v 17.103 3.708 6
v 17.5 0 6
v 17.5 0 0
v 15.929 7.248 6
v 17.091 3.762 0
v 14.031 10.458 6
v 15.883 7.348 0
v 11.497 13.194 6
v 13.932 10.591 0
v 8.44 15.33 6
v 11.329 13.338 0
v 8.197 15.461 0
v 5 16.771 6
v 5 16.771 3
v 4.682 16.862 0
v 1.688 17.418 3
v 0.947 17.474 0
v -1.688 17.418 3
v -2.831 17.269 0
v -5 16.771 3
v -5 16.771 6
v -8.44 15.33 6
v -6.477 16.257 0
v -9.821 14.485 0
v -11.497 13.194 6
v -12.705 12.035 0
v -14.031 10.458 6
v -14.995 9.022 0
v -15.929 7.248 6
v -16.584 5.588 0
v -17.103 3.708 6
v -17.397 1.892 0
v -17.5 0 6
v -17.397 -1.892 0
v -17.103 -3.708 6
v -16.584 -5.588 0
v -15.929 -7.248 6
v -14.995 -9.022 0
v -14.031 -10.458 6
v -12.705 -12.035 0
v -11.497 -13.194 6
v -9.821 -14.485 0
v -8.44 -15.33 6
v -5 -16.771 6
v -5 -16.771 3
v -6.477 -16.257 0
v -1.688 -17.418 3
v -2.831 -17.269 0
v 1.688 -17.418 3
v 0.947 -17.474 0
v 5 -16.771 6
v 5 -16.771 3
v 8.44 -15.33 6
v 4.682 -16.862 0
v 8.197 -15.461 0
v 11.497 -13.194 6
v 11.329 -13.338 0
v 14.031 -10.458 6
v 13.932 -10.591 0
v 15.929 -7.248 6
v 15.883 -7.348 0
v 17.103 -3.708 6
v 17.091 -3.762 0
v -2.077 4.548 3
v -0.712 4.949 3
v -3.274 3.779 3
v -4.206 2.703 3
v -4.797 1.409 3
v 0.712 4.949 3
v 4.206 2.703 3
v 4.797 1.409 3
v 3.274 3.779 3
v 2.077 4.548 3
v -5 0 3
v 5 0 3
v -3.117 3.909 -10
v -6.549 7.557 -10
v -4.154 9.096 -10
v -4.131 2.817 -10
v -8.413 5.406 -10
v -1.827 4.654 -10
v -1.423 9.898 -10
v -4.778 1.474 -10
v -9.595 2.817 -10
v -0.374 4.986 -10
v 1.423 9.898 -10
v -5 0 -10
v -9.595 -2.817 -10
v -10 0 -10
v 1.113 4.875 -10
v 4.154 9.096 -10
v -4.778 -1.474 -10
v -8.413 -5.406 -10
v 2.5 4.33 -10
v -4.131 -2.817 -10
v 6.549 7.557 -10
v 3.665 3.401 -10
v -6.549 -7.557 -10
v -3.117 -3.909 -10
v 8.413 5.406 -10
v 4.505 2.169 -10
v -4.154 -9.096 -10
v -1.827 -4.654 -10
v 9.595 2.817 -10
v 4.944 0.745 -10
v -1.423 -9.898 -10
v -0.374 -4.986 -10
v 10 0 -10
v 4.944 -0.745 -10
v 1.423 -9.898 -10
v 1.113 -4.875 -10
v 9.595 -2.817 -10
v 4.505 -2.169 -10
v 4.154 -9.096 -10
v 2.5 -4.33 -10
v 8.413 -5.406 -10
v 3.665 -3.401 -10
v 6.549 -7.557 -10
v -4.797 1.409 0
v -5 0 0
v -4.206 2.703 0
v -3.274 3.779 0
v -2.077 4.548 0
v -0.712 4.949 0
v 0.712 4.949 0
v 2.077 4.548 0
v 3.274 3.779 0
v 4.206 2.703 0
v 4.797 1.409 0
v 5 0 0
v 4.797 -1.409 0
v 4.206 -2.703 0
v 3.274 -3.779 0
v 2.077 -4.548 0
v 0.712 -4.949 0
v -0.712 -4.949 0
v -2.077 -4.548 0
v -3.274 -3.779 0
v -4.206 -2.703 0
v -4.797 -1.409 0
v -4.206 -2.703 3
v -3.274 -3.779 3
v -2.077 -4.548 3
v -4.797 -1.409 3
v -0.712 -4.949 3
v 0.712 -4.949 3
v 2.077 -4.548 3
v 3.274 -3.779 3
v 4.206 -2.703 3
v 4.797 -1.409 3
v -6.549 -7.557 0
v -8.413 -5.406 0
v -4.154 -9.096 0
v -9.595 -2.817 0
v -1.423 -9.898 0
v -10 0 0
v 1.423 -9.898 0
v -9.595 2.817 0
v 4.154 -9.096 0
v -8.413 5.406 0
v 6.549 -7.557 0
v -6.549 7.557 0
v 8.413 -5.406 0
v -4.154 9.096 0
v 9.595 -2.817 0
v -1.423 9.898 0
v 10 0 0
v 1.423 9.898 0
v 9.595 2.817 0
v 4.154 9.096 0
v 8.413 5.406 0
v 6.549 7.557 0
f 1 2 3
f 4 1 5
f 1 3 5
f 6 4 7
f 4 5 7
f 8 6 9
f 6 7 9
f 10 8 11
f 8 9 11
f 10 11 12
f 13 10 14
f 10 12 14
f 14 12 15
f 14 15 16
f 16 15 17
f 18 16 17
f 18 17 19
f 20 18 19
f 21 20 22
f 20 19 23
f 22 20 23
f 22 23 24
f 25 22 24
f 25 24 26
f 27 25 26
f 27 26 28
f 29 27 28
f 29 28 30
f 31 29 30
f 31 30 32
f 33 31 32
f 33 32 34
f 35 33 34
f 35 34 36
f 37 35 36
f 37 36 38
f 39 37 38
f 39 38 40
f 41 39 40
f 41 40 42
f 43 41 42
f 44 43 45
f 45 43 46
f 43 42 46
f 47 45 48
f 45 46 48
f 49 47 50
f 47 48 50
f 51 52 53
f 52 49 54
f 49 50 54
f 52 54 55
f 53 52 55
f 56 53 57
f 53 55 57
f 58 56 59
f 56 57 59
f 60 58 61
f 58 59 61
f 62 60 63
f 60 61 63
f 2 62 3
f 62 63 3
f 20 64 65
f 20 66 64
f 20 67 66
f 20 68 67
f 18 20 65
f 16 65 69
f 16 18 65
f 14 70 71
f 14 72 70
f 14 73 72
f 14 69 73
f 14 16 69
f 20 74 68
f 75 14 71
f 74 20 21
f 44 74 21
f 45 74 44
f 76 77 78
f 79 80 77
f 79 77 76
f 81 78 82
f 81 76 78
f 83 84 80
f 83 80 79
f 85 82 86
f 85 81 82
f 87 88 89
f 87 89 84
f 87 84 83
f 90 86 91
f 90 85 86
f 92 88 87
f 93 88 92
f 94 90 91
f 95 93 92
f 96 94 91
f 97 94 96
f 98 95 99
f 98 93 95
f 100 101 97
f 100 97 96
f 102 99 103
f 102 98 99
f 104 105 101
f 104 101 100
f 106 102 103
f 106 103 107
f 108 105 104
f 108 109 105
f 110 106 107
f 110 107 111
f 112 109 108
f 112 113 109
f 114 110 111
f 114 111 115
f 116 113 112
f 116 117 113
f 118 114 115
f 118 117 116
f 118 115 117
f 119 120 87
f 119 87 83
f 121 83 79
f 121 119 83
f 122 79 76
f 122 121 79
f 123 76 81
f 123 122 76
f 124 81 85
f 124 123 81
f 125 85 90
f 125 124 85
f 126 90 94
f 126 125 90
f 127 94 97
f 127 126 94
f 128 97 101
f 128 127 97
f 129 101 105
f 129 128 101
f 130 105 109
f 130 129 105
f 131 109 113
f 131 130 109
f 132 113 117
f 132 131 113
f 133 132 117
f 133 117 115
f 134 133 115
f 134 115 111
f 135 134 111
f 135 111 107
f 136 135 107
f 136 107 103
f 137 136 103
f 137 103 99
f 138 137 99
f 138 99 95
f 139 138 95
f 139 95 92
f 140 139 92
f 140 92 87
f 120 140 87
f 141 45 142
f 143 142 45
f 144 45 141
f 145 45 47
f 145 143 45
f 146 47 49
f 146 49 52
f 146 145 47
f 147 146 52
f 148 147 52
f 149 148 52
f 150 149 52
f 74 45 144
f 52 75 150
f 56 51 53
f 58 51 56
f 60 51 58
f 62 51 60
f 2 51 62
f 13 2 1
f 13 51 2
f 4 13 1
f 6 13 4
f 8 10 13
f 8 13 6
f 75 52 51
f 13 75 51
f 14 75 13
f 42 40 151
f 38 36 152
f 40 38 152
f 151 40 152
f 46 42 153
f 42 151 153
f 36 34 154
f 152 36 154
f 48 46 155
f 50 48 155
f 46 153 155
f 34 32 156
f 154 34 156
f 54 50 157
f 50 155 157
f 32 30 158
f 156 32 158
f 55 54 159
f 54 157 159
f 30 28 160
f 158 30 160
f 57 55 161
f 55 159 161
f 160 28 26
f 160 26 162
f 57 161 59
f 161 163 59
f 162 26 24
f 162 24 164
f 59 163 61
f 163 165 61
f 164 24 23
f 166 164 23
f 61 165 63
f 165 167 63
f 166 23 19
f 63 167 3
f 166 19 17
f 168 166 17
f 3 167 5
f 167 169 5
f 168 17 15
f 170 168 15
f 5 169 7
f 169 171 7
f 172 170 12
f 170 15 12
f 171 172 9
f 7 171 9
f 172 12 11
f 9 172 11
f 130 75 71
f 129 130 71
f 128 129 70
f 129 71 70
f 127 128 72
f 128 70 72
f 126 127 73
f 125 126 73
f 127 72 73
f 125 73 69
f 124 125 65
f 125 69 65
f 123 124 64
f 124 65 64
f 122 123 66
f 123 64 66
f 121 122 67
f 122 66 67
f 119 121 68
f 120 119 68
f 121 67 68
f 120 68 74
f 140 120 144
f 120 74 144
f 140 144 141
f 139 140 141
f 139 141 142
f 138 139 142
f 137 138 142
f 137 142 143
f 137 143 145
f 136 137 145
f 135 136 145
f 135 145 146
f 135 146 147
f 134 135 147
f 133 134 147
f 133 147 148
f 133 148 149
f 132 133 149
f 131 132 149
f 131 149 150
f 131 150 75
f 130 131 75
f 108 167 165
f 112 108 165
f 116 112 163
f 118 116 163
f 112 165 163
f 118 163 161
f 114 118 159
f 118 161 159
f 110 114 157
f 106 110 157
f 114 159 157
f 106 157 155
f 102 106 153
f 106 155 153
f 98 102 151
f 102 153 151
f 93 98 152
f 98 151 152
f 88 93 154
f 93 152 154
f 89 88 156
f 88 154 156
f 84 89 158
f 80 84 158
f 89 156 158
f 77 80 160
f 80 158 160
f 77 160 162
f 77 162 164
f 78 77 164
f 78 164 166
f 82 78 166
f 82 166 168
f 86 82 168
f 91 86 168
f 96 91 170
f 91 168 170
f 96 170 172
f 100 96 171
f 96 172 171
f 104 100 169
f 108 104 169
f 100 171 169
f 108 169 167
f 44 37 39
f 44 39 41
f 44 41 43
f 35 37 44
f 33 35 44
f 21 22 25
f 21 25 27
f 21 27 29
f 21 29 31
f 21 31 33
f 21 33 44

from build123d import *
from build123d.topology import SkipClean

# Parameters (mm, degrees)
SKETCH1_R           = 17.5
BOSS_EXTRUDE1_DEPTH = 6
CUT_EXTRUDE1_START  = -3
CUT_EXTRUDE1_DEPTH  = 3
SKETCH3_R           = 5
CUT_EXTRUDE2_DEPTH  = 11
SKETCH4_R           = 10
SKETCH4_R_2         = 5
BOSS_EXTRUDE2_DEPTH = 10


with BuildPart() as part:
    # Sketch1 → Boss-Extrude1 (new body)
    with BuildSketch(Plane.XY):
        Circle(SKETCH1_R)
    extrude(amount=BOSS_EXTRUDE1_DEPTH)

    # Sketch2 → Cut-Extrude1 (cut)
    with BuildSketch(Plane.XY.offset(6).offset(CUT_EXTRUDE1_START)):
        with BuildLine():
            Line((-5, 16.770509831), (-5, -16.770509831))
            ThreePointArc((-5, -16.770509831), (0, -17.5), (5, -16.770509831))
            Line((5, -16.770509831), (5, 16.770509831))
            ThreePointArc((5, 16.770509831), (0, 17.5), (-5, 16.770509831))
        make_face()
    extrude(amount=CUT_EXTRUDE1_DEPTH, mode=Mode.SUBTRACT)

    # Sketch3 → Cut-Extrude2 (cut)
    with BuildSketch(Plane.XY.offset(6)):
        Circle(SKETCH3_R)
    extrude(amount=-CUT_EXTRUDE2_DEPTH, mode=Mode.SUBTRACT)

    # Sketch4 → Boss-Extrude2 (add)
    with SkipClean():  # the faces are left unmerged after this step: merging them gives an invalid solid
        with BuildSketch(Plane(origin=(0, 0, 0), x_dir=(-1, 0, 0), z_dir=(0, 0, -1))):
            with Locations(Location((0, 0, 0), (0, 0, 180))):
                Circle(SKETCH4_R)
            Circle(SKETCH4_R_2, mode=Mode.SUBTRACT)
        extrude(amount=BOSS_EXTRUDE2_DEPTH)


solid = part.part
